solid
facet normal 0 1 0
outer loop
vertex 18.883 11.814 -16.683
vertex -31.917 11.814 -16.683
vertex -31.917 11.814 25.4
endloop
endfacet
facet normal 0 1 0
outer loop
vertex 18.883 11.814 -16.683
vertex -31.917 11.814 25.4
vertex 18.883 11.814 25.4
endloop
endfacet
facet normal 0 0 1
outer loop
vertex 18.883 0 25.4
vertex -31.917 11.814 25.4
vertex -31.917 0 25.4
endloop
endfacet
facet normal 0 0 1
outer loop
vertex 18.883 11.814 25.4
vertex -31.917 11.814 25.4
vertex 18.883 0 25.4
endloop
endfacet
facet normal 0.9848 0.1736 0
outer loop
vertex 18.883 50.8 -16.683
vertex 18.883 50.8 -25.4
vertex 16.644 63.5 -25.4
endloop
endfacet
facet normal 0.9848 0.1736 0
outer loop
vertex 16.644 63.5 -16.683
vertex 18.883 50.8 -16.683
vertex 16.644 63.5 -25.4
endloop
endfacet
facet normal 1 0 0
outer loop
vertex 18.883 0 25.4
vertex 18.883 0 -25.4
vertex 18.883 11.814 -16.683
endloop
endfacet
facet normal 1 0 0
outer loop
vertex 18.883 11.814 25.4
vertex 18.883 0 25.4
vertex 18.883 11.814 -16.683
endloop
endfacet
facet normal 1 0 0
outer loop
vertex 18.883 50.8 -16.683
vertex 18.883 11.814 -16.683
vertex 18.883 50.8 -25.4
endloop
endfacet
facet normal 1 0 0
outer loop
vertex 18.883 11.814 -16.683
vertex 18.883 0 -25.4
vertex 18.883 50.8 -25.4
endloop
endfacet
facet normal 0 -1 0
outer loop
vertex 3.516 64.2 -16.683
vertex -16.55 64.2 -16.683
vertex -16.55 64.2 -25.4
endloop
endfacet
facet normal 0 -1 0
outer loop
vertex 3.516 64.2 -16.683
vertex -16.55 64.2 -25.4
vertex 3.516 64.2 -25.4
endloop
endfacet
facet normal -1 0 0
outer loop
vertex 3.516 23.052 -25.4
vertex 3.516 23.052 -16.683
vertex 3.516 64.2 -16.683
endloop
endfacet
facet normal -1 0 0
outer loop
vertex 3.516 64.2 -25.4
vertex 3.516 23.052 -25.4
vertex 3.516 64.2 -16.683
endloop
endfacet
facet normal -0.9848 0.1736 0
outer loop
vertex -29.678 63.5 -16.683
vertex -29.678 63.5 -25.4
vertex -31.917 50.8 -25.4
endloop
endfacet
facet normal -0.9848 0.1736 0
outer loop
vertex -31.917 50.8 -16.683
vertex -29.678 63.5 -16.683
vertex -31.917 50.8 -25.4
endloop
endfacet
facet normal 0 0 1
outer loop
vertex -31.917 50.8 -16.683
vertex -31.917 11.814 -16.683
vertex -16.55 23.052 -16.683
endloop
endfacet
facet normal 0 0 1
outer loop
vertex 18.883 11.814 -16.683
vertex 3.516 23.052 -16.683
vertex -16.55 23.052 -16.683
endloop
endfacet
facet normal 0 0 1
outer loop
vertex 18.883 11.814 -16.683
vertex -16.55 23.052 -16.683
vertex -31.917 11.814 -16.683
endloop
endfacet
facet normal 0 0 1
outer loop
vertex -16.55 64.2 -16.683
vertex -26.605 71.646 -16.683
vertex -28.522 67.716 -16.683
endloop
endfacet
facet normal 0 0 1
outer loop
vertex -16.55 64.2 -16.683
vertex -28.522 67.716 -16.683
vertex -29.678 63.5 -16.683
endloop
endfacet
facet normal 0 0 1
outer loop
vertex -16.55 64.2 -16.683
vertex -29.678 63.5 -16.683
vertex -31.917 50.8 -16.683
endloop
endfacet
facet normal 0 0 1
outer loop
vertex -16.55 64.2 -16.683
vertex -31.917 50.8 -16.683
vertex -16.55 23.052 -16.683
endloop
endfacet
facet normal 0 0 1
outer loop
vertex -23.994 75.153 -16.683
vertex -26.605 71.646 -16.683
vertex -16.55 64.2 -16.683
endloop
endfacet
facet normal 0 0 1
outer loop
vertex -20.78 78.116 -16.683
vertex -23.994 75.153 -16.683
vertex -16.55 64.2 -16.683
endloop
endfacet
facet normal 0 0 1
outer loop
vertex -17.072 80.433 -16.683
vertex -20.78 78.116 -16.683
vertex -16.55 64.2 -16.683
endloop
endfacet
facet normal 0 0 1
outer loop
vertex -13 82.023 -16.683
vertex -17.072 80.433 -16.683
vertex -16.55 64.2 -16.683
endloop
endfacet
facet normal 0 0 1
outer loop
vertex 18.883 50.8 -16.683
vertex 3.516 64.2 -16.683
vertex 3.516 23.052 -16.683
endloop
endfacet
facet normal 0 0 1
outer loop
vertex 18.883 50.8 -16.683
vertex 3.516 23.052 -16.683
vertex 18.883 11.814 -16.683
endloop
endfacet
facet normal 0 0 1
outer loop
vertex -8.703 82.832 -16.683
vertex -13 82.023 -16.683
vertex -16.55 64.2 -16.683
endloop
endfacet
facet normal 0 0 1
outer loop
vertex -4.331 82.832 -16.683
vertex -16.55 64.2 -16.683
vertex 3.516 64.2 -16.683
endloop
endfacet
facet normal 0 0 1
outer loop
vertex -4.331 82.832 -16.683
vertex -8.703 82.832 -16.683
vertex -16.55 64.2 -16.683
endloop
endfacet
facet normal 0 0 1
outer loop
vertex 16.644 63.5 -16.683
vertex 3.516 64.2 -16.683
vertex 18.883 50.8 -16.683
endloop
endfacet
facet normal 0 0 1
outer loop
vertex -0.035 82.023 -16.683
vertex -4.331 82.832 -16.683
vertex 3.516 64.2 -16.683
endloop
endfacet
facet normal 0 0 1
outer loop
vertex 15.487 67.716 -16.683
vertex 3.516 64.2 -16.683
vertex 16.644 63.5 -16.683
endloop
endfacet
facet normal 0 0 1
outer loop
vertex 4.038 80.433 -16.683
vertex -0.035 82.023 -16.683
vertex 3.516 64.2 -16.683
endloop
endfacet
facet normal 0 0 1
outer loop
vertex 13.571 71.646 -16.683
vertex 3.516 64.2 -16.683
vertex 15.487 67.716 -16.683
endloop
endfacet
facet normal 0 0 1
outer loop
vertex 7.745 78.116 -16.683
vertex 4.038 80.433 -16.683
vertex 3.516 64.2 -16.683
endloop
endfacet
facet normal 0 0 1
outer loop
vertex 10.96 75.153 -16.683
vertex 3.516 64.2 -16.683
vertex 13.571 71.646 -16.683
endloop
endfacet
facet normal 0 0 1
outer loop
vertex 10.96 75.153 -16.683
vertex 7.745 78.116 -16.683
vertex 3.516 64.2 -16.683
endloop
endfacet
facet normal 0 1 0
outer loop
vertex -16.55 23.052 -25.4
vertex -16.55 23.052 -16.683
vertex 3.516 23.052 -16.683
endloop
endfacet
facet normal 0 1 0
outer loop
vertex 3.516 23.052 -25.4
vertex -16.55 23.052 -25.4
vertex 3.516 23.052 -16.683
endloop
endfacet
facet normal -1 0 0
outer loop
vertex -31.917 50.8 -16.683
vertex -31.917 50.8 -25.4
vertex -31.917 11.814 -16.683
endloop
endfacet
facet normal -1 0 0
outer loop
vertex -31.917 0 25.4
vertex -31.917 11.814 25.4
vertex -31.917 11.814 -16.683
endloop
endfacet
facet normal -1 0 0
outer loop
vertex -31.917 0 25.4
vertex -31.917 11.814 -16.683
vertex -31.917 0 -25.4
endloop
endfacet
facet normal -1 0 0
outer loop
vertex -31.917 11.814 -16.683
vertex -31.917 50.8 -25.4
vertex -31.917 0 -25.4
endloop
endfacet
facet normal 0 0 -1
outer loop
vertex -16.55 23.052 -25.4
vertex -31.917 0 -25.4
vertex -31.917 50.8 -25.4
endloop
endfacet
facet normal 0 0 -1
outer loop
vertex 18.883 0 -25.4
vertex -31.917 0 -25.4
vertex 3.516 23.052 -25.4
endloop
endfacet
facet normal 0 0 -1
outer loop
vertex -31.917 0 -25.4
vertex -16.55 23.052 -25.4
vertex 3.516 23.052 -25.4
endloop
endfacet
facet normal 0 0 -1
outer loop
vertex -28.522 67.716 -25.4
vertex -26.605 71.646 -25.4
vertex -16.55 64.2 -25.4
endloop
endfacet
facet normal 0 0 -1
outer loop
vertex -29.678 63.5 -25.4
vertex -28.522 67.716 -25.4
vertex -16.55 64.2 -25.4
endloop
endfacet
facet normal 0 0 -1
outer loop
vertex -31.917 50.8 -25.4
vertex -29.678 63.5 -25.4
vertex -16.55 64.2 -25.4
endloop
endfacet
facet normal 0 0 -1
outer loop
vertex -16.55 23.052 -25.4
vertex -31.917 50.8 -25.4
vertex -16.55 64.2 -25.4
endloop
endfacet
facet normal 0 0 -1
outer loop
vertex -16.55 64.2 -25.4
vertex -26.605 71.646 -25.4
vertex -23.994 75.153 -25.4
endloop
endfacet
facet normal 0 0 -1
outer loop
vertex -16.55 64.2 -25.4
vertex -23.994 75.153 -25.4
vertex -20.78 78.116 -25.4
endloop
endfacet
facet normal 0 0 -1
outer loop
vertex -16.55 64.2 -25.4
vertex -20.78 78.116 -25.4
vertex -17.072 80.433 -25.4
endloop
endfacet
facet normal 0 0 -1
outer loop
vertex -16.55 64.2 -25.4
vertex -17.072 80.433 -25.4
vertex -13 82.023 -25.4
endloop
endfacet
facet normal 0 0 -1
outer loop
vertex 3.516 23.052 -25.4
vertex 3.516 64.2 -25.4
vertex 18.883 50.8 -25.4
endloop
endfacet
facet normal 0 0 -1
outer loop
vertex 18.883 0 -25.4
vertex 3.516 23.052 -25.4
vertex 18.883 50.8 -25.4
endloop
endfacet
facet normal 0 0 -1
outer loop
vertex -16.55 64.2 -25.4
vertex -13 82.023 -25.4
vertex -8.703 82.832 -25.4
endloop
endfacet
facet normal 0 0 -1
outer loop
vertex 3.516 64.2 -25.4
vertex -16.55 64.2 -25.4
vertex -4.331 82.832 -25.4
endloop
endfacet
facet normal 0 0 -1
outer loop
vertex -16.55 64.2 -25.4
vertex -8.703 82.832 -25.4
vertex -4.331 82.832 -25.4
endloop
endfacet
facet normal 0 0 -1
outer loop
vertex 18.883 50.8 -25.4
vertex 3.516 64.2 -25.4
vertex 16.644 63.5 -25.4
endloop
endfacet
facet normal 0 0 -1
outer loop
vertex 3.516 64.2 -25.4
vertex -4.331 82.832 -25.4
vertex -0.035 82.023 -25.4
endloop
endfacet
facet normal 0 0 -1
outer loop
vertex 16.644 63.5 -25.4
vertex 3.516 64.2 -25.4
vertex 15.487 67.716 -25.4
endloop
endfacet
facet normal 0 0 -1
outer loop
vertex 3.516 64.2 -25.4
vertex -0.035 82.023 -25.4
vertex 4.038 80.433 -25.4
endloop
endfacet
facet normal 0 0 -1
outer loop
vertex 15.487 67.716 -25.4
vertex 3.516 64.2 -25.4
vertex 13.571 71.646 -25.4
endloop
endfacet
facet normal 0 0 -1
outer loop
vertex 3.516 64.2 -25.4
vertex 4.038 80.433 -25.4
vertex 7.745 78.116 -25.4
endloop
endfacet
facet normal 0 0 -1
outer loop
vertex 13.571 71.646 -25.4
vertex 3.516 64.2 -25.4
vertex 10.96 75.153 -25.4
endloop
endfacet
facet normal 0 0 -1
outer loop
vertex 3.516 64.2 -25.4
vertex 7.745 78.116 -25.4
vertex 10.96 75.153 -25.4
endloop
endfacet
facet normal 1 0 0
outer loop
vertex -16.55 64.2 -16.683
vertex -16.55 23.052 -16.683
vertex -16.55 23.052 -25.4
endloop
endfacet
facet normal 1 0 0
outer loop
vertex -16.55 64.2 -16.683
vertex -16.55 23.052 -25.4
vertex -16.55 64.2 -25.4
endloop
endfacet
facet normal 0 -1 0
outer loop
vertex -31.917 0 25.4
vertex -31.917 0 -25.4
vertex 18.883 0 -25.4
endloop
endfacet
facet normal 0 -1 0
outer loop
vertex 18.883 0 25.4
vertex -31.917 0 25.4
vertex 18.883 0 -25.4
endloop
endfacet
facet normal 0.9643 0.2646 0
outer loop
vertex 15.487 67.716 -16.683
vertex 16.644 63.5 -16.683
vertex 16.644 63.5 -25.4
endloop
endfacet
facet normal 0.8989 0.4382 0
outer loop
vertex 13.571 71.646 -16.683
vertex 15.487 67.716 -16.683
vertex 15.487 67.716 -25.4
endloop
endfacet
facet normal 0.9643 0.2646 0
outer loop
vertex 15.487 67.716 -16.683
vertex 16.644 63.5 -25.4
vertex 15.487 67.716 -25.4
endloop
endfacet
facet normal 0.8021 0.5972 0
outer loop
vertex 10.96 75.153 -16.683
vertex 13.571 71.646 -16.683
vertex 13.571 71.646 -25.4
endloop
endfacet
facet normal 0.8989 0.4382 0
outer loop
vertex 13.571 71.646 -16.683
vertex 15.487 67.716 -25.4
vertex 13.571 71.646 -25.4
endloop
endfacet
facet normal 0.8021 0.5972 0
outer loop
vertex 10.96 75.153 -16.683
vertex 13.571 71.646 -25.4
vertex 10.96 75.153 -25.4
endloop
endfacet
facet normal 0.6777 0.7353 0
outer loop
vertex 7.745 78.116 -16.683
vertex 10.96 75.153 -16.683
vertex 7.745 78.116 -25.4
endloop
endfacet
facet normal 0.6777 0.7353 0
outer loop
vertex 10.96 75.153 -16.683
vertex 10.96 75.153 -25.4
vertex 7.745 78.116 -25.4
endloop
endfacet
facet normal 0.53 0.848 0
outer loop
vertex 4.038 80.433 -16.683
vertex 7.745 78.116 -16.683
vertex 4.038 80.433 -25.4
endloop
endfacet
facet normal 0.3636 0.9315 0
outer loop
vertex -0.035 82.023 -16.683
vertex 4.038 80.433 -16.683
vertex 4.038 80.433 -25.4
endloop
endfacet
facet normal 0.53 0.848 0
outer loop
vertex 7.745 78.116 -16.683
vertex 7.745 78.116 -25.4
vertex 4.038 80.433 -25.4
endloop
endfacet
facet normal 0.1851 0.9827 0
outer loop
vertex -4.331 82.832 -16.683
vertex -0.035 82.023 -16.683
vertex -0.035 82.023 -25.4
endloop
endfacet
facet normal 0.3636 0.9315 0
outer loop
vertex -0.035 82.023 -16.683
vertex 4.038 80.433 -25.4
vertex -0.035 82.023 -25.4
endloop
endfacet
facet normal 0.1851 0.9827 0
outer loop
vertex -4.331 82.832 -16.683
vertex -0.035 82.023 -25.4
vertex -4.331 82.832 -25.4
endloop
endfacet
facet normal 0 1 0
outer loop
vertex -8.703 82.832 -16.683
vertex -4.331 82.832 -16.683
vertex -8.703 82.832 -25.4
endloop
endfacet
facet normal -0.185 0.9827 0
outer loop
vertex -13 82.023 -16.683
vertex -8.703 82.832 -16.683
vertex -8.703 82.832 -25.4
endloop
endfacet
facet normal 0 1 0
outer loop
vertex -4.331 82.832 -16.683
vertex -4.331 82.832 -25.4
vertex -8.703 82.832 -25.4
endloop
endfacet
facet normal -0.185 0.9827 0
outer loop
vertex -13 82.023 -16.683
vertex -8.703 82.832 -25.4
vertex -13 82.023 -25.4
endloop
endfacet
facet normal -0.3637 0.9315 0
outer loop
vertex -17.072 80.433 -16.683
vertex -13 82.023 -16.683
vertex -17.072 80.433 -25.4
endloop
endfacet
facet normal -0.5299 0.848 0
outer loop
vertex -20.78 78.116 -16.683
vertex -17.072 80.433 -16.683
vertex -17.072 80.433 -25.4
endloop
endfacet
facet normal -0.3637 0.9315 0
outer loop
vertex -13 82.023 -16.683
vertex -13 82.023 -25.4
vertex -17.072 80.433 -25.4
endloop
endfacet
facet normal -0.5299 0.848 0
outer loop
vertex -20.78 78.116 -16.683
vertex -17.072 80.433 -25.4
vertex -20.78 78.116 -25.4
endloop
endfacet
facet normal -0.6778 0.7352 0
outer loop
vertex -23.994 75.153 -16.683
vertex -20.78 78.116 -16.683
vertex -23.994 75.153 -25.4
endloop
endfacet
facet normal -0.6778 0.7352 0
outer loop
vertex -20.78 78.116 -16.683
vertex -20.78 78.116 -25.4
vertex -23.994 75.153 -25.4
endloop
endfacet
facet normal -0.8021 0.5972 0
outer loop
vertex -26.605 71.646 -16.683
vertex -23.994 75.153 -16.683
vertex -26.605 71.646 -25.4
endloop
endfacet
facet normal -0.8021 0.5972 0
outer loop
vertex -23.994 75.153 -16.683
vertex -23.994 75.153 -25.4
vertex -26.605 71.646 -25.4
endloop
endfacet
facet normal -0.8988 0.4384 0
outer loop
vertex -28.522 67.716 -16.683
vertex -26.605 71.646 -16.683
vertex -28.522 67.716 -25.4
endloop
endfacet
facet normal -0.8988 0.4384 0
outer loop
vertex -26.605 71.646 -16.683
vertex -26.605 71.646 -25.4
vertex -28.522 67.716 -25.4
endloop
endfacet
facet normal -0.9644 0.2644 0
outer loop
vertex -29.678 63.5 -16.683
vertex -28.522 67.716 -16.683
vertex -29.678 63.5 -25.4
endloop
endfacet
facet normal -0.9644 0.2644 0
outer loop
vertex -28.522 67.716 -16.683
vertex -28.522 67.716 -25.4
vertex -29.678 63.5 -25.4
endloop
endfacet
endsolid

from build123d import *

# Parameters (mm, degrees)
BOSS_EXTRUDE2_DEPTH      = 25.4
BOSS_EXTRUDE2_DEPTH_BACK = 25.4
SKETCH5_W                = 55.996028866
SKETCH5_H                = 43.041519522
CUT_EXTRUDE2_DEPTH       = 71.12
CUT_EXTRUDE4_REACH       = 104.359
SKETCH8_W                = 20.066
SKETCH8_H                = 41.148


with BuildPart() as part:
    # Sketch3 → Boss-Extrude2 (new, two sides: drawn at the far end of the back side and taken through both)
    with BuildSketch(Plane.XY.offset(-BOSS_EXTRUDE2_DEPTH_BACK)):
        with BuildLine():
            Line((-31.917133282, 0), (18.882866718, 0))
            Line((18.882866718, 0), (18.882866718, 50.8))
            Line((18.882866718, 50.8), (16.643514063, 63.5))
            ThreePointArc((16.643514063, 63.5), (-6.517133282, 82.934090645), (-29.677780627, 63.5))
            Line((-29.677780627, 63.5), (-31.917133282, 50.8))
            Line((-31.917133282, 50.8), (-31.917133282, 0))
        make_face()
    extrude(amount=BOSS_EXTRUDE2_DEPTH + BOSS_EXTRUDE2_DEPTH_BACK)

    # Sketch5 → Cut-Extrude2 (cut)
    with BuildSketch(Plane(origin=(0, 82.934090645, 0), x_dir=(1, 0, 0), z_dir=(0, 1, 0))):
        with Locations((-7.030712477, -4.838222216)):
            Rectangle(SKETCH5_W, SKETCH5_H)
    extrude(amount=-CUT_EXTRUDE2_DEPTH, mode=Mode.SUBTRACT)

    # Sketch8 → Cut-Extrude4 (cut, up to next)
    with BuildSketch(Plane.XY.offset(25.4), mode=Mode.PRIVATE) as cut_extrude4_sk1:
        with Locations((-6.517133282, 43.625792805)):
            Rectangle(SKETCH8_W, SKETCH8_H)
    cut_extrude4_tool1 = extrude(cut_extrude4_sk1.sketch, amount=-CUT_EXTRUDE4_REACH, mode=Mode.PRIVATE) & part.part
    add(cut_extrude4_tool1.solids().sort_by_distance((-6.517133, 43.625793, 25.4))[0], mode=Mode.SUBTRACT)


solid = part.part
